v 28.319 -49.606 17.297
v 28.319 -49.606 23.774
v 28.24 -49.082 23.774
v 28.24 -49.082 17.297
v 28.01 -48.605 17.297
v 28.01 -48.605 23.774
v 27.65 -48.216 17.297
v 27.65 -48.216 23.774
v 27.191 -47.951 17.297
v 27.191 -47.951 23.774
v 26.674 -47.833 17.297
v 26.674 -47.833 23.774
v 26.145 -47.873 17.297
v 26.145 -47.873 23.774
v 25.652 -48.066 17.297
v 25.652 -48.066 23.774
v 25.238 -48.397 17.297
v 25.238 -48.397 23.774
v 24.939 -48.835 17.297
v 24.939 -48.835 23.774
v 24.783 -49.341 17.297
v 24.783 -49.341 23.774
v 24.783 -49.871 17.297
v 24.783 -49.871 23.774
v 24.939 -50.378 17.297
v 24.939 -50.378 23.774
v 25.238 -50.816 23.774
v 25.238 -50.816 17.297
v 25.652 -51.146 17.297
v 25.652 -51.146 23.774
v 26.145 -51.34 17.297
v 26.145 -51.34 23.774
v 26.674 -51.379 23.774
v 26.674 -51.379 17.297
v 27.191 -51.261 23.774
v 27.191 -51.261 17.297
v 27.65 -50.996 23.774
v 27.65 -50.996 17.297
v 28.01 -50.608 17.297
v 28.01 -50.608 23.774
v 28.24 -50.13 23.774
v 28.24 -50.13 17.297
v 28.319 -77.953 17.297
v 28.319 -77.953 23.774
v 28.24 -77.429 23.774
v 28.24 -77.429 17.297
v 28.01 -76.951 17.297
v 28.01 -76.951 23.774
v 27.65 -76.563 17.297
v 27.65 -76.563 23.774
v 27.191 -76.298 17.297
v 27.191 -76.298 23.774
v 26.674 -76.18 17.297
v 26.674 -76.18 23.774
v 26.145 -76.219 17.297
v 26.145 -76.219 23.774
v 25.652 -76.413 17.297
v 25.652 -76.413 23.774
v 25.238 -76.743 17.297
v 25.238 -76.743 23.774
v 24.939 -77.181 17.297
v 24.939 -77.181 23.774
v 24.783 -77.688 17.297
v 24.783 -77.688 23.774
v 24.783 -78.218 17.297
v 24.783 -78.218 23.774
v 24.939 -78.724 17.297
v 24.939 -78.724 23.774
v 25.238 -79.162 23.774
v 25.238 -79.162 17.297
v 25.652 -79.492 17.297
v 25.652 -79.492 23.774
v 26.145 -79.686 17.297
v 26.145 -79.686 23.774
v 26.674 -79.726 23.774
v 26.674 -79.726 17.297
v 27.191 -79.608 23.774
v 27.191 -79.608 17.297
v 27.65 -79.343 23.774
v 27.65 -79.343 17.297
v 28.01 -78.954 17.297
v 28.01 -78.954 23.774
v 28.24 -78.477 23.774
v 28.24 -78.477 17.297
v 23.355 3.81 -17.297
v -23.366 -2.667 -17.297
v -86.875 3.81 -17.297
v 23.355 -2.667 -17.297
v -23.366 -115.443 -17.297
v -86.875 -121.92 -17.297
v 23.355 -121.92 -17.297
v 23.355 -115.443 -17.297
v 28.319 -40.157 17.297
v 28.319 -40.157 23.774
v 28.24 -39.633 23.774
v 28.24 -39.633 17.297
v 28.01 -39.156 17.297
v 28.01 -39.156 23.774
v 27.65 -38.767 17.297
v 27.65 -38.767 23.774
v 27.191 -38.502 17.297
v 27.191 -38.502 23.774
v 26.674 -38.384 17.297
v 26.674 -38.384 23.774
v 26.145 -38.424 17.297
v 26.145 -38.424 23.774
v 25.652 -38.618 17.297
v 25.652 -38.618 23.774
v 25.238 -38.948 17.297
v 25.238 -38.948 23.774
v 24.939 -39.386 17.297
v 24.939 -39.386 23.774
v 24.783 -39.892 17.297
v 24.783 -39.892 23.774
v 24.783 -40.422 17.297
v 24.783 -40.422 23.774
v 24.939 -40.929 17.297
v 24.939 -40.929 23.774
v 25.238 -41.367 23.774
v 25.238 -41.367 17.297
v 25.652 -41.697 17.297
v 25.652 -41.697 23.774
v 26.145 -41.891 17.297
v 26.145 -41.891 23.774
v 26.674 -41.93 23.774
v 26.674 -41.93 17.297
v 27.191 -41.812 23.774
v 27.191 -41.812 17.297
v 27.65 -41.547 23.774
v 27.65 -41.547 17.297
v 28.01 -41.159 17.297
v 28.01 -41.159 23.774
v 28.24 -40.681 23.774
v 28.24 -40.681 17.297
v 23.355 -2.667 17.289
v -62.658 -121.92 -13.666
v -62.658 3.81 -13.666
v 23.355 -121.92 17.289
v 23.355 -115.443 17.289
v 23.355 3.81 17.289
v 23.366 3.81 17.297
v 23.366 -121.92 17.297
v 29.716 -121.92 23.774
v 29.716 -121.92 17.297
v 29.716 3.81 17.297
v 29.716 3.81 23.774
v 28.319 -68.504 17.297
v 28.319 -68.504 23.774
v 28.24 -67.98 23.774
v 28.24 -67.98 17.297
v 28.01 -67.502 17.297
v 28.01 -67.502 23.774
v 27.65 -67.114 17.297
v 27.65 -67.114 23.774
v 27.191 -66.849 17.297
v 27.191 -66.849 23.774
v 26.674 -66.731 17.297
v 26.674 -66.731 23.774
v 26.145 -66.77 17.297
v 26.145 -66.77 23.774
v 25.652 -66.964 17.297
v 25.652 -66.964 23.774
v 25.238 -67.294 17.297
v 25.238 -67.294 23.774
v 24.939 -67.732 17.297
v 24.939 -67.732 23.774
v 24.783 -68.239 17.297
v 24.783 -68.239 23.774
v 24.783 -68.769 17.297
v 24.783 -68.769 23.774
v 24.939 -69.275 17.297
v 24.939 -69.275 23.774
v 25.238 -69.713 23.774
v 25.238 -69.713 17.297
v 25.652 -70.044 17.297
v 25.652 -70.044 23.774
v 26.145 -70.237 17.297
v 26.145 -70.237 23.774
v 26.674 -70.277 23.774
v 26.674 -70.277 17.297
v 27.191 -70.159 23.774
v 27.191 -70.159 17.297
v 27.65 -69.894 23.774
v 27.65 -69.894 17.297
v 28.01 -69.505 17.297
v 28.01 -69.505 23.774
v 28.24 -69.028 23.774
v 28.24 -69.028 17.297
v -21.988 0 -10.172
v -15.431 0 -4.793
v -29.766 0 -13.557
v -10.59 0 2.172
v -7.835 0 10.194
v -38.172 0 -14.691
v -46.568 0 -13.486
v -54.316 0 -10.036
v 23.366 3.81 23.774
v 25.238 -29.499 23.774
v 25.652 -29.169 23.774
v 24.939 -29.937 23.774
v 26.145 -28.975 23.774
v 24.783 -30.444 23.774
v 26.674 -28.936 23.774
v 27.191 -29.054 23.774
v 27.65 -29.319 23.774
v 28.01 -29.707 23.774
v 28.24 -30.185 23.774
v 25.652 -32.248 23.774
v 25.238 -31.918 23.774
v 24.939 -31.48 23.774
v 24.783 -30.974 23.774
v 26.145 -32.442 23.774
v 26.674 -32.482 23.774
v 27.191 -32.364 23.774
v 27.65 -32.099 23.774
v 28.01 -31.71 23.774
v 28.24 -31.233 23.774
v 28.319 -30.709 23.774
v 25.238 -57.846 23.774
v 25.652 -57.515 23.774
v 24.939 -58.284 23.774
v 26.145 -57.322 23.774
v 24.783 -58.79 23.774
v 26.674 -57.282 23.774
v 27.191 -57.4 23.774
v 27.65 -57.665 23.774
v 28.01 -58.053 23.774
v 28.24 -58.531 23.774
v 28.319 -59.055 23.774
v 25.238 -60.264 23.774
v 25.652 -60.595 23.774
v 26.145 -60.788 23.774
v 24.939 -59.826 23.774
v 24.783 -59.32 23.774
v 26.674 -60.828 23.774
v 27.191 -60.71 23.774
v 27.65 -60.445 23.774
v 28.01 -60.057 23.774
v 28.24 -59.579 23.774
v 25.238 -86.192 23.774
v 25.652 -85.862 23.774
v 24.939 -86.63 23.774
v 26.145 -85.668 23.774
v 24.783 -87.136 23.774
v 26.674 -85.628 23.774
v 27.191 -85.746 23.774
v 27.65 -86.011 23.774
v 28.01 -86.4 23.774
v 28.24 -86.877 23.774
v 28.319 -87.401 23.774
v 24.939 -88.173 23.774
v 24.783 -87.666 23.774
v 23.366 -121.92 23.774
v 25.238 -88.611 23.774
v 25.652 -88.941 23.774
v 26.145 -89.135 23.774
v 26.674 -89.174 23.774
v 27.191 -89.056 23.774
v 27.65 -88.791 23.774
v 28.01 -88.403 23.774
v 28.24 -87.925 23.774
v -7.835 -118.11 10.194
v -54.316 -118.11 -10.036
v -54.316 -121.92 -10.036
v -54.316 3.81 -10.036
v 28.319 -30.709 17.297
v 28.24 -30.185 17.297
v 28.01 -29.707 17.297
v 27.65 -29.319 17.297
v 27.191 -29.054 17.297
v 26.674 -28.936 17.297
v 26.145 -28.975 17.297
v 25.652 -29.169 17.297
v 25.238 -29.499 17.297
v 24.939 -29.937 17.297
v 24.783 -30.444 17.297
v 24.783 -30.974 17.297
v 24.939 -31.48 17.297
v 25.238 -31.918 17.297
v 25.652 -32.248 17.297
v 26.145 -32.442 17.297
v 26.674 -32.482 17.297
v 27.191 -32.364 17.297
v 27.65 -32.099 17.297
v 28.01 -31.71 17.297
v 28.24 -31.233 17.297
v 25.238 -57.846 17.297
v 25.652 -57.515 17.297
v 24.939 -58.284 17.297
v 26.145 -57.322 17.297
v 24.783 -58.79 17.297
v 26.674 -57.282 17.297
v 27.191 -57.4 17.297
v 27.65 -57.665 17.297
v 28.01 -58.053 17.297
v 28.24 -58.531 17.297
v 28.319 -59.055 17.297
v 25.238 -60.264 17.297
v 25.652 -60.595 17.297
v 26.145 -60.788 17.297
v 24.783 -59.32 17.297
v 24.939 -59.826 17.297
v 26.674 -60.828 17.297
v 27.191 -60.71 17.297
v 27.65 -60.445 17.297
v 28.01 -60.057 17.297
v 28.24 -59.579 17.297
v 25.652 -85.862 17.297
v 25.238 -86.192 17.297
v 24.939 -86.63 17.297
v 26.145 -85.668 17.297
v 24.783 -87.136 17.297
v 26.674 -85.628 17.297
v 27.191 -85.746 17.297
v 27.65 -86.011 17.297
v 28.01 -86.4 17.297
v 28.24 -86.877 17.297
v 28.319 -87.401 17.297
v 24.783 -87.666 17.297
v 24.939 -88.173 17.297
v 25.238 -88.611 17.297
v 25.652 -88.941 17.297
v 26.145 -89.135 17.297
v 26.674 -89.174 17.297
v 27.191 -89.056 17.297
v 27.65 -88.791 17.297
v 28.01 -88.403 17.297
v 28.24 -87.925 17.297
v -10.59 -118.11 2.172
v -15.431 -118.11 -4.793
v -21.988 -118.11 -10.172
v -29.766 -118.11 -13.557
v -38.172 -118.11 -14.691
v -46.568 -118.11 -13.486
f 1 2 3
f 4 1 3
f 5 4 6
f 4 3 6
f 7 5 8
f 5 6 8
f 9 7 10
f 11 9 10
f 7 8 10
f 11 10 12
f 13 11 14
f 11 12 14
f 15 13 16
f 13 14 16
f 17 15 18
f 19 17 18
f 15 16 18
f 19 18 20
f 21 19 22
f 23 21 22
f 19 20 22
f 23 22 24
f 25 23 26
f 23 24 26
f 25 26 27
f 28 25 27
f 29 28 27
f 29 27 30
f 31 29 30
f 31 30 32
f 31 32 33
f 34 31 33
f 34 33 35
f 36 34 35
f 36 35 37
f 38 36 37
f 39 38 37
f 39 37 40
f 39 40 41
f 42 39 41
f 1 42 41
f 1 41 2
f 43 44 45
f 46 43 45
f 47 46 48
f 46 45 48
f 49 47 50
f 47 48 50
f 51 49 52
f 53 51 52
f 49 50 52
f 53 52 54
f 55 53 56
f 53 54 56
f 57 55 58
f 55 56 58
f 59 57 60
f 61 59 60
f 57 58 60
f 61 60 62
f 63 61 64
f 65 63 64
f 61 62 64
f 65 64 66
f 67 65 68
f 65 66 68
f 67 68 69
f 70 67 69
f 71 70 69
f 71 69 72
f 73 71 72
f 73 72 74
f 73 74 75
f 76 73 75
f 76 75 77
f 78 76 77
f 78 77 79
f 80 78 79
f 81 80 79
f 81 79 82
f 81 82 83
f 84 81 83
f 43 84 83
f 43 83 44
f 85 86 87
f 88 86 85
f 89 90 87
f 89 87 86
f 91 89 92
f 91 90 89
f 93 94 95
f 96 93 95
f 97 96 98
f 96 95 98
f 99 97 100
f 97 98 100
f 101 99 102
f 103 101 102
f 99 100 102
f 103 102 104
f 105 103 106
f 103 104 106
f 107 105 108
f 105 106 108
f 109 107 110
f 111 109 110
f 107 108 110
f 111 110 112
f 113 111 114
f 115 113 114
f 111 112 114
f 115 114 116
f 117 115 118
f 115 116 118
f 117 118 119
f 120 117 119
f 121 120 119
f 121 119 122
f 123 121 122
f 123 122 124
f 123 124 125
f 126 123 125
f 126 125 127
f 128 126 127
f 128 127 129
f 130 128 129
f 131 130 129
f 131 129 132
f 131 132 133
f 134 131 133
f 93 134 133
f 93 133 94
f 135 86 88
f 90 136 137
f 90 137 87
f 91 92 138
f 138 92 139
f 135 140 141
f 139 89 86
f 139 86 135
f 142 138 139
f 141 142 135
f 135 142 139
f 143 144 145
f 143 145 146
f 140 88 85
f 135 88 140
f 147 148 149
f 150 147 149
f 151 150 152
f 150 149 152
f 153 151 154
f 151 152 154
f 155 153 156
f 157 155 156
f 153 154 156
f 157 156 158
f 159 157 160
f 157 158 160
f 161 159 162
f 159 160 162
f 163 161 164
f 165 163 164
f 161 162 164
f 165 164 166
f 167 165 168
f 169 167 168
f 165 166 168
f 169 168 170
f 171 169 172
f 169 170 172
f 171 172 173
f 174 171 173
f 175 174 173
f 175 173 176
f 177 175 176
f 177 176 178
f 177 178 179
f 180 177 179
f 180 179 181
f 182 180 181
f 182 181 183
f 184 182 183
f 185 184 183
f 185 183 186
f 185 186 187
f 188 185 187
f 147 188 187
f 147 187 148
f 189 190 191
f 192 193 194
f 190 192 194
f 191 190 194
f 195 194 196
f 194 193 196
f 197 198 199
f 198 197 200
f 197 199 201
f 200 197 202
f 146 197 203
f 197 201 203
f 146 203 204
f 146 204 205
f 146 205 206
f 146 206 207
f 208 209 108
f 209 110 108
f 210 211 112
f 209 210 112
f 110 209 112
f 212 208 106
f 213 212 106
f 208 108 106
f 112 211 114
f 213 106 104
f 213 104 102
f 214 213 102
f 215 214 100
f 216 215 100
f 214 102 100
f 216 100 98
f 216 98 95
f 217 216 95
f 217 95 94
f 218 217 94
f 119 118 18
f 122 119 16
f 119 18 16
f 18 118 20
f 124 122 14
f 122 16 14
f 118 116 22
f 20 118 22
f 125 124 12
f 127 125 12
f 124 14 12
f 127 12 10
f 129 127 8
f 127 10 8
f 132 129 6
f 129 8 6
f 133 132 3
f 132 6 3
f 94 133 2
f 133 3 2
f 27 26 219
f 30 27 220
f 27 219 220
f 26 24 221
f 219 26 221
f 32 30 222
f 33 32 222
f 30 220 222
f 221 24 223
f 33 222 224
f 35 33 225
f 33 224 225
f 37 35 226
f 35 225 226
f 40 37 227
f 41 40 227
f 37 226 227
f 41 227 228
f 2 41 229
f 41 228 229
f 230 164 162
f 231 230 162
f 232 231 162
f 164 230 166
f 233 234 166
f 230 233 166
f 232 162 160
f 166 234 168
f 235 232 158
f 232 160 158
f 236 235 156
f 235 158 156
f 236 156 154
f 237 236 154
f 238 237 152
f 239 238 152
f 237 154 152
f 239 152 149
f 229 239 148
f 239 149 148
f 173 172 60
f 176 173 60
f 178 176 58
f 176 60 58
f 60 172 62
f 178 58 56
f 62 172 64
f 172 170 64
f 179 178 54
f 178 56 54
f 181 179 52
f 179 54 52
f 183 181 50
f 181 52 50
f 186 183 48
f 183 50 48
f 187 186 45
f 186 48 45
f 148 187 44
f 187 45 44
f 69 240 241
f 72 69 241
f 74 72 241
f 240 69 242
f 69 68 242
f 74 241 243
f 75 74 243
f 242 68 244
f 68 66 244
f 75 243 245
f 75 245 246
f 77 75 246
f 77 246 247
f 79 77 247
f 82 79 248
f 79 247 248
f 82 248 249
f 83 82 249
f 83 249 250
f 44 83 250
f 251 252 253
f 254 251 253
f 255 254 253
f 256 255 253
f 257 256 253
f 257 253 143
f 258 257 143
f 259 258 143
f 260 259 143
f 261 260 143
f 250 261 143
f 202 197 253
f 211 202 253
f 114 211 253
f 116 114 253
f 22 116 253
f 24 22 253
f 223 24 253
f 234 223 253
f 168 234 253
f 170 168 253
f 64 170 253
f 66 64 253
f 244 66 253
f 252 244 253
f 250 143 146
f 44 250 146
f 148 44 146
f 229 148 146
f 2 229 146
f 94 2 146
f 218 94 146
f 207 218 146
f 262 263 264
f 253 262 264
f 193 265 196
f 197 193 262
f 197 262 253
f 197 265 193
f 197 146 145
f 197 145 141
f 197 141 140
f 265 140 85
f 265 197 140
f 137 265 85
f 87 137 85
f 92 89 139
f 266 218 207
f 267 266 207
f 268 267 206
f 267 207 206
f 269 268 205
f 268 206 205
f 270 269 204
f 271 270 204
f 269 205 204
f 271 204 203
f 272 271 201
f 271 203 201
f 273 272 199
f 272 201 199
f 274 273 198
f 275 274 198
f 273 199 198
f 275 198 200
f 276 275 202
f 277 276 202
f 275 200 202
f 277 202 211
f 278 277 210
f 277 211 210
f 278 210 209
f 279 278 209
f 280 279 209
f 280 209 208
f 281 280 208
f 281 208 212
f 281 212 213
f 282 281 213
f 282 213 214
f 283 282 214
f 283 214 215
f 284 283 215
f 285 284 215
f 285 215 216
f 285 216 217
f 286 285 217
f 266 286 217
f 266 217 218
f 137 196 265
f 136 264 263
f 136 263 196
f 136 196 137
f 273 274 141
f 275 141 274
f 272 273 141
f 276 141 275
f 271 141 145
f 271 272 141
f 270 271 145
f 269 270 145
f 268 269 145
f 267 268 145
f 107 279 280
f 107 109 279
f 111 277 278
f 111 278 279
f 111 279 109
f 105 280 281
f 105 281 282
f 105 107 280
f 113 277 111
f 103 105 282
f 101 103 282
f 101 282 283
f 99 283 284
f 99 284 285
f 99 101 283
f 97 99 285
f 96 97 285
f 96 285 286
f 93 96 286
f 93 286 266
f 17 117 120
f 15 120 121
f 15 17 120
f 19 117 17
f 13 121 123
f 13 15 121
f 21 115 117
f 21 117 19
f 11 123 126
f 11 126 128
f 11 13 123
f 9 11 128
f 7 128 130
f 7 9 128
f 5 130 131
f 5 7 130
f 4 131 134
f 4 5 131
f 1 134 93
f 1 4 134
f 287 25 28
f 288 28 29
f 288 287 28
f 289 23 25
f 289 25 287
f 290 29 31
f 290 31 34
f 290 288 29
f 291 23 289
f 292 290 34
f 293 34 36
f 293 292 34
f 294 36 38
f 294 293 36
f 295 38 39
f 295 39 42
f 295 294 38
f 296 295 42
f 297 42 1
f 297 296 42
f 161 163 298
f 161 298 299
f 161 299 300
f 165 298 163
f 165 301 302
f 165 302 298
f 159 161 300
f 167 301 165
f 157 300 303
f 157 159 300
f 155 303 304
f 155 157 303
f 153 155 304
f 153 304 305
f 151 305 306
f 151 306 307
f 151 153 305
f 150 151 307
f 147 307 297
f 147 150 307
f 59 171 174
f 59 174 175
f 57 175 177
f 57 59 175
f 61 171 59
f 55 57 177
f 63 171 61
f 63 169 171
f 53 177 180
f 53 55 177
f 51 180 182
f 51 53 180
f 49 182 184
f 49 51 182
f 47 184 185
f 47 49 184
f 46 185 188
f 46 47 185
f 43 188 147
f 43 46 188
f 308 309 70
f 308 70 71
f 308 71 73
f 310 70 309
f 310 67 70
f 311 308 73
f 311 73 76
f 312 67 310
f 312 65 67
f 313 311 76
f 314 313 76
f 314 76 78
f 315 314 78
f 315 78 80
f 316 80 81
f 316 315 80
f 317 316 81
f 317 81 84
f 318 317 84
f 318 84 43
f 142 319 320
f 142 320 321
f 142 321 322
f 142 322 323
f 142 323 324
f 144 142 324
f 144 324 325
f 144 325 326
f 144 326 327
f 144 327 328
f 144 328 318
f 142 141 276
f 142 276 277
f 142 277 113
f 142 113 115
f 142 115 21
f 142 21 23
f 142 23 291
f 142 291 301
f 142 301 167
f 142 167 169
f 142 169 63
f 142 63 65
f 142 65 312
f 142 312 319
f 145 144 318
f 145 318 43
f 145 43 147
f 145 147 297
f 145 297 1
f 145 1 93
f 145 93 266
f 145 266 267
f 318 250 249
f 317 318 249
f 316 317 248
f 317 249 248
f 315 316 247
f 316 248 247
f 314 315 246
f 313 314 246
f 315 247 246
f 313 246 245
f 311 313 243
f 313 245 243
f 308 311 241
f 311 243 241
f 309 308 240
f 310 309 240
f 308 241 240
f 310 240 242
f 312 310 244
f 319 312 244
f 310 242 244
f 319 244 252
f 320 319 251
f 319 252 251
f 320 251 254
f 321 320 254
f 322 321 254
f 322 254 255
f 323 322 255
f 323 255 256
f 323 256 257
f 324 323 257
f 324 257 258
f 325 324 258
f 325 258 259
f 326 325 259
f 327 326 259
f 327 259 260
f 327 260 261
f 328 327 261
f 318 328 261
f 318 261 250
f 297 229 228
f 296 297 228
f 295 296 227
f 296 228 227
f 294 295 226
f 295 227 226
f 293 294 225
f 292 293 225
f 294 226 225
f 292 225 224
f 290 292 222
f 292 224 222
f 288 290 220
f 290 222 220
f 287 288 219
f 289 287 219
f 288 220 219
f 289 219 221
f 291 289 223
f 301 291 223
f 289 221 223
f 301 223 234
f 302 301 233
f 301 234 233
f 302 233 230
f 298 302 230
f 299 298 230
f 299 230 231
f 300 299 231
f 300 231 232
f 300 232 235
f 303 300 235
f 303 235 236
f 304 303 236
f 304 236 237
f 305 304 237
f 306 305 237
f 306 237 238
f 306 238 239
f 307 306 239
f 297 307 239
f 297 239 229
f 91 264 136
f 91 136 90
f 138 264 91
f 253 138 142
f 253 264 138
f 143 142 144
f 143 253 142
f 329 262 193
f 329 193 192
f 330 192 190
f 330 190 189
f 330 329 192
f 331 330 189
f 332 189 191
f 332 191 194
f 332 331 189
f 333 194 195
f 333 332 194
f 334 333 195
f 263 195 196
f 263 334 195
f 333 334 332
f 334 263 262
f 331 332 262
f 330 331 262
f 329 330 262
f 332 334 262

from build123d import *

# Parameters (mm, degrees)
F0_W      = 6.35
F0_H      = 6.477
F1_DEPTH  = 118.11
F2_R      = 1.778
F3_DEPTH  = 25.4
F4_W      = 46.721395
F4_H      = 2.667
F6_DEPTH  = 3.81
F8_DEPTH  = 3.81
F9_DEPTH  = 3.81
F11_DEPTH = 3.81


with BuildPart() as f1:
    # F0 (on Front) → F1 (new body)
    with BuildSketch(Plane.XZ):
        with BuildLine():
            Line((-71.0004344583, -17.2970571), (-23.3659426, -17.2970571))
            Line((-23.3659426, -17.2970571), (23.3659426, 17.2970571))
            Line((23.3659426, 17.2970571), (23.3659426, 23.7740571))
            Line((23.3659426, 23.7740571), (-7.8349318041, 10.194488659))
            ThreePointArc((-7.8349318041, 10.194488659), (-25.7599625829, -12.133990102), (-54.3163019367, -10.0356157532))
            Line((-54.3163019367, -10.0356157532), (-62.6583681975, -13.6663364266))
            Line((-62.6583681975, -13.6663364266), (-86.8754344583, -17.2970571))
            Line((-86.8754344583, -17.2970571), (-71.0004344583, -17.2970571))
        make_face()
        with Locations((26.5409426, 20.5355571)):
            Rectangle(F0_W, F0_H)
    extrude(amount=F1_DEPTH)

    # F2 (on face) → F3 (cut)
    with BuildSketch(Plane.XY.offset(23.7740571)):
        with Locations((26.5409426, -59.055)):
            Circle(F2_R)
        with Locations((26.5409426, -49.6062)):
            Circle(F2_R)
        with Locations((26.5409426, -40.1574)):
            Circle(F2_R)
        with Locations((26.5409426, -68.5038)):
            Circle(F2_R)
        with Locations((26.5409426, -77.9526)):
            Circle(F2_R)
        with Locations((26.5409426, -30.7086)):
            Circle(F2_R)
        with Locations((26.5409426, -87.4014)):
            Circle(F2_R)
    extrude(amount=-F3_DEPTH, mode=Mode.SUBTRACT)

    # F4 (on face) → F5 (join, up to the next surface of F1)
    with BuildSketch(Plane(origin=(0, 0, -17.2970571), x_dir=(1, 0, 0), z_dir=(0, 0, -1))):
        with Locations((-0.0052451, 116.7765)):
            Rectangle(F4_W, F4_H)
        with Locations((-0.0052451, 1.3335)):
            Rectangle(F4_W, F4_H)
    extrude(until=Until.NEXT, dir=(0, 0, 1))

    # F6 (add): a face of the model
    f6_faces = [f1.faces().sort_by_distance(p)[0] for p in [
        (-1.9615853711, -118.11, -2.7916369403),
    ]]
    extrude(f6_faces, amount=F6_DEPTH)

    # F7 (on face) → F8 (join)
    with BuildSketch(Plane.XZ.offset(121.92)):
        with BuildLine():
            Line((-7.8349318041, 10.194488659), (-54.3163019367, -10.0356157532))
            ThreePointArc((-54.3163019367, -10.0356157532), (-25.7599625829, -12.133990102), (-7.8349318041, 10.194488659))
        make_face()
    extrude(amount=-F8_DEPTH)

    # F9 (add): a face of the model
    f9_faces = [f1.faces().sort_by_distance(p)[0] for p in [
        (-1.9615853711, 0, -2.7916369403),
    ]]
    extrude(f9_faces, amount=F9_DEPTH)

    # F10 (on face) → F11 (join)
    with BuildSketch(Plane(origin=(0, 3.81, 0), x_dir=(-1, 0, 0), z_dir=(0, 1, 0))):
        with BuildLine():
            Line((54.3163019367, -10.0356157532), (7.8349318041, 10.194488659))
            ThreePointArc((7.8349318041, 10.194488659), (25.7599625829, -12.133990102), (54.3163019367, -10.0356157532))
        make_face()
    extrude(amount=-F11_DEPTH)


solid = f1.part
